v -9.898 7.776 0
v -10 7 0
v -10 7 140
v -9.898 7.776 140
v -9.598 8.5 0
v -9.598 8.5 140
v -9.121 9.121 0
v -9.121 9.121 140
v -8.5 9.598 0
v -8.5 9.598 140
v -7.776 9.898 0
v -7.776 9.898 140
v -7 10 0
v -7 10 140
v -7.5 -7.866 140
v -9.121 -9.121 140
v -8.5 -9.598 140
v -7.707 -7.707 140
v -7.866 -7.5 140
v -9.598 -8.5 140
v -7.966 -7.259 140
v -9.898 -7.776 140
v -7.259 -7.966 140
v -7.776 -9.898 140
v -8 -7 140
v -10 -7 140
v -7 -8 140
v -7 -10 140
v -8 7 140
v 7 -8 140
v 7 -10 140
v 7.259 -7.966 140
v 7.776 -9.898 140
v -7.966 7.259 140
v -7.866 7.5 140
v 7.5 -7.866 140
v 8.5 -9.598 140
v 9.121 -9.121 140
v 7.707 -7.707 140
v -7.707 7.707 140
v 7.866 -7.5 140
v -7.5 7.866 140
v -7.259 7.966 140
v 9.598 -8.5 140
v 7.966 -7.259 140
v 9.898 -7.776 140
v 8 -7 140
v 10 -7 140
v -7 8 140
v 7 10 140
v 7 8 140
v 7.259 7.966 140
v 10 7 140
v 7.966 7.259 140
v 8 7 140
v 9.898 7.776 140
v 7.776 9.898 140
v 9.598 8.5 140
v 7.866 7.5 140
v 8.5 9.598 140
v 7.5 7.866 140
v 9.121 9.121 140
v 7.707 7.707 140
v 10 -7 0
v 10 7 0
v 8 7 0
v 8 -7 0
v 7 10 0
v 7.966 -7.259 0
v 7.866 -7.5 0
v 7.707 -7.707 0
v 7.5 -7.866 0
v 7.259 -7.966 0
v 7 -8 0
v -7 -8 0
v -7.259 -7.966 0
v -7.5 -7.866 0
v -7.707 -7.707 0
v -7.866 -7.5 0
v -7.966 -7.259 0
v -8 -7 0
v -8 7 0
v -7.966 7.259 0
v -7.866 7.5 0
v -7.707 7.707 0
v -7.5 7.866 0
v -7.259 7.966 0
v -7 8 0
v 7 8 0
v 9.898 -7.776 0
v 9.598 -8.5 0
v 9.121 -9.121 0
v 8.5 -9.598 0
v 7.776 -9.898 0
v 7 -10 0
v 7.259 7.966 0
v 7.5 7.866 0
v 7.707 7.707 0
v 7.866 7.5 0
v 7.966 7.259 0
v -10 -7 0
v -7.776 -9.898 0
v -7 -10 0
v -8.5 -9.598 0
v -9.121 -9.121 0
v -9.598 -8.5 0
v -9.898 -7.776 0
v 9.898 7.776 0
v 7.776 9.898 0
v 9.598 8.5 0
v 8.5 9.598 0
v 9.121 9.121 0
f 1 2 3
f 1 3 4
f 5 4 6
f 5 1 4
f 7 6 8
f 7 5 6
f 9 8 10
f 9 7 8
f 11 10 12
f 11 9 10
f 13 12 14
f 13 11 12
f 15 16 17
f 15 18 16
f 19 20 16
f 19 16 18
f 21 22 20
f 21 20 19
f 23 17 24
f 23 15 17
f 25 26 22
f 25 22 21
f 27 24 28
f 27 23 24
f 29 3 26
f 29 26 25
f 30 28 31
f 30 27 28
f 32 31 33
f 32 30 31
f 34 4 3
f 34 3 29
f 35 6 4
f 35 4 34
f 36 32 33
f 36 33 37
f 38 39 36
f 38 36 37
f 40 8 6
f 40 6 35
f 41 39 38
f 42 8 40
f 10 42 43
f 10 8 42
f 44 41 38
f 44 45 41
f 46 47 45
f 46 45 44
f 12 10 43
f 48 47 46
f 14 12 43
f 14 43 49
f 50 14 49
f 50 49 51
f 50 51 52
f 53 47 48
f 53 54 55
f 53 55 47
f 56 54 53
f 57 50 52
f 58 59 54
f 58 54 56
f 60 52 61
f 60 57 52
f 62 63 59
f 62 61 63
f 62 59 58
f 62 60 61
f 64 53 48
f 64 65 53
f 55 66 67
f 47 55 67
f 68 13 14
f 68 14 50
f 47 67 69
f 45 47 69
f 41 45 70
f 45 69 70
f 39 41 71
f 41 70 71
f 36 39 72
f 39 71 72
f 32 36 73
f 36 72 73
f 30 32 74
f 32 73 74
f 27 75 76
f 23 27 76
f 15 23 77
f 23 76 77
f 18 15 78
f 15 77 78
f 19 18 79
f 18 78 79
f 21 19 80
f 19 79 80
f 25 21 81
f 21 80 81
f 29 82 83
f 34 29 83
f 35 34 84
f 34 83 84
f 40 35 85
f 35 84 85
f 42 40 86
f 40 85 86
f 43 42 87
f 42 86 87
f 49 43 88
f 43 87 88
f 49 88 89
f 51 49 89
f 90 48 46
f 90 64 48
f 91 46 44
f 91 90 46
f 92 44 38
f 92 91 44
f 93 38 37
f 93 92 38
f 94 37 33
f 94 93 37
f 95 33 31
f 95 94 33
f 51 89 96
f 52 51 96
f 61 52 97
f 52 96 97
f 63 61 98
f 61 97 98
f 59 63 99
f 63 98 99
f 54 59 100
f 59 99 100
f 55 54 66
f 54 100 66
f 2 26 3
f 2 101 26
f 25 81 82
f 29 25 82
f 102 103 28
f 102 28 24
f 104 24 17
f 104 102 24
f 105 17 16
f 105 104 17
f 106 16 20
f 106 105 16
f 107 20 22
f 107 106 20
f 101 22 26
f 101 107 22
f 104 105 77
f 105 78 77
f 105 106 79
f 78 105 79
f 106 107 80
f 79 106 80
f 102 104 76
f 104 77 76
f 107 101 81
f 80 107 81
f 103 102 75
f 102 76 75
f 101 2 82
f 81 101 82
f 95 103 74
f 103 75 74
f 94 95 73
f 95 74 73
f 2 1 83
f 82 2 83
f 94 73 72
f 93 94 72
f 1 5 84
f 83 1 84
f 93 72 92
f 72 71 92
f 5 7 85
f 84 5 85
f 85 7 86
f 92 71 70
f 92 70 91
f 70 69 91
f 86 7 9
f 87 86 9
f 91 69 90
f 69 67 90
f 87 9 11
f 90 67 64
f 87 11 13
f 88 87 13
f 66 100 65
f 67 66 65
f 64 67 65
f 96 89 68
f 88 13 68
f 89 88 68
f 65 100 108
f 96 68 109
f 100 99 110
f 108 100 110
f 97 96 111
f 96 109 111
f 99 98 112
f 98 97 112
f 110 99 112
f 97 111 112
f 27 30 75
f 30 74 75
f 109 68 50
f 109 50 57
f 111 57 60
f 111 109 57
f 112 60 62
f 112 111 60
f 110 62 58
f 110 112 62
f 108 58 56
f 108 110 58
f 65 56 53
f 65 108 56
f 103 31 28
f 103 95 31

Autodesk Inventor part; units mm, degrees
ref_plane "Start Plane" through (0, 0, 0) normal (0, 0, 1) x (1, 0, 0)
ref_plane "End Plane" through (0, 0, 140) normal (0, 0, 1) x (1, 0, 0)
sketch "Sketch" plane through (0, 0, 0) normal (0, 0, 1) x (1, 0, 0)
  line L0 (-10, -7) -> (-10, 7)
  line L1 (-7, 10) -> (7, 10)
  line L2 (10, 7) -> (10, -7)
  line L3 (7, -10) -> (-7, -10)
  arc A0 (-10, -7) -> (-7, -10) centre (-7, -7) ccw
  arc A1 (-7, 10) -> (-10, 7) centre (-7, 7) ccw
  arc A2 (10, 7) -> (7, 10) centre (7, 7) ccw
  arc A3 (7, -10) -> (10, -7) centre (7, -7) ccw
  arc A4 (-7, 8) -> (-8, 7) centre (-7, 7) ccw
  line L4 (-7, 8) -> (7, 8)
  arc A5 (8, 7) -> (7, 8) centre (7, 7) ccw
  line L5 (8, 7) -> (8, -7)
  arc A6 (7, -8) -> (8, -7) centre (7, -7) ccw
  line L6 (7, -8) -> (-7, -8)
  arc A7 (-8, -7) -> (-7, -8) centre (-7, -7) ccw
  line L7 (-8, -7) -> (-8, 7)
  line L8 (0, 14.8698) -> (0, -14.8698) construction
  line L9 (-14.8698, 0) -> (14.8698, 0) construction
  dimension "d7" = 3
  dimension "d10" = 20
  dimension "d11" = 20
  dimension "d12" = 2
  dimension "d15" = 10
  dimension "d16" = 10
extrude "Body" add sketch "Sketch" along normal up to surface (140 mm away) from surface at 0
sketch "Sketch3" plane through (0, 0, 0) normal (0, 0, 1) x (1, 0, 0)
  line L0 (0, 0) -> (10, 0)
ref_plane "Work Plane3" through (0, 0, 0) normal (0, -1, 0) x (1, 0, 0)
sketch "Sketch4" plane through (0, 0, 0) normal (0, -1, 0) x (1, 0, 0)
  line L0 (-2, 0) -> (12, 0)
  line L1 (-2, 140) -> (12, 140)
  dimension "d18" = 140
ref_plane "Work Plane5" through (-7, -100, 140) normal (0, 0, 1) x (1, 0, 0)
split "Split2" plane through (-7, -100, 140) removes the side toward (0, 0, 1)
equation "\"d7\" = G_IR"
equation "\"d10\" = G_H"
equation "\"d11\" = G_W"
equation "\"d12\" = G_T"
equation "\"d15\" = 0.5 * d10"
equation "\"d16\" = 0.5 * d11"
equation "\"d3\" = G_L"
equation "\"G_W\" = 20"
equation "\"G_H\" = 20"
equation "\"G_T\" = 2"
equation "\"G_IR\" = 3"
equation "\"G_L\" = d18"
equation "\"G_OFFSET_START\" = 0"
properties part number "ISO 12633-2 - 20x20x2 - 140" material "Steel, Mild"
